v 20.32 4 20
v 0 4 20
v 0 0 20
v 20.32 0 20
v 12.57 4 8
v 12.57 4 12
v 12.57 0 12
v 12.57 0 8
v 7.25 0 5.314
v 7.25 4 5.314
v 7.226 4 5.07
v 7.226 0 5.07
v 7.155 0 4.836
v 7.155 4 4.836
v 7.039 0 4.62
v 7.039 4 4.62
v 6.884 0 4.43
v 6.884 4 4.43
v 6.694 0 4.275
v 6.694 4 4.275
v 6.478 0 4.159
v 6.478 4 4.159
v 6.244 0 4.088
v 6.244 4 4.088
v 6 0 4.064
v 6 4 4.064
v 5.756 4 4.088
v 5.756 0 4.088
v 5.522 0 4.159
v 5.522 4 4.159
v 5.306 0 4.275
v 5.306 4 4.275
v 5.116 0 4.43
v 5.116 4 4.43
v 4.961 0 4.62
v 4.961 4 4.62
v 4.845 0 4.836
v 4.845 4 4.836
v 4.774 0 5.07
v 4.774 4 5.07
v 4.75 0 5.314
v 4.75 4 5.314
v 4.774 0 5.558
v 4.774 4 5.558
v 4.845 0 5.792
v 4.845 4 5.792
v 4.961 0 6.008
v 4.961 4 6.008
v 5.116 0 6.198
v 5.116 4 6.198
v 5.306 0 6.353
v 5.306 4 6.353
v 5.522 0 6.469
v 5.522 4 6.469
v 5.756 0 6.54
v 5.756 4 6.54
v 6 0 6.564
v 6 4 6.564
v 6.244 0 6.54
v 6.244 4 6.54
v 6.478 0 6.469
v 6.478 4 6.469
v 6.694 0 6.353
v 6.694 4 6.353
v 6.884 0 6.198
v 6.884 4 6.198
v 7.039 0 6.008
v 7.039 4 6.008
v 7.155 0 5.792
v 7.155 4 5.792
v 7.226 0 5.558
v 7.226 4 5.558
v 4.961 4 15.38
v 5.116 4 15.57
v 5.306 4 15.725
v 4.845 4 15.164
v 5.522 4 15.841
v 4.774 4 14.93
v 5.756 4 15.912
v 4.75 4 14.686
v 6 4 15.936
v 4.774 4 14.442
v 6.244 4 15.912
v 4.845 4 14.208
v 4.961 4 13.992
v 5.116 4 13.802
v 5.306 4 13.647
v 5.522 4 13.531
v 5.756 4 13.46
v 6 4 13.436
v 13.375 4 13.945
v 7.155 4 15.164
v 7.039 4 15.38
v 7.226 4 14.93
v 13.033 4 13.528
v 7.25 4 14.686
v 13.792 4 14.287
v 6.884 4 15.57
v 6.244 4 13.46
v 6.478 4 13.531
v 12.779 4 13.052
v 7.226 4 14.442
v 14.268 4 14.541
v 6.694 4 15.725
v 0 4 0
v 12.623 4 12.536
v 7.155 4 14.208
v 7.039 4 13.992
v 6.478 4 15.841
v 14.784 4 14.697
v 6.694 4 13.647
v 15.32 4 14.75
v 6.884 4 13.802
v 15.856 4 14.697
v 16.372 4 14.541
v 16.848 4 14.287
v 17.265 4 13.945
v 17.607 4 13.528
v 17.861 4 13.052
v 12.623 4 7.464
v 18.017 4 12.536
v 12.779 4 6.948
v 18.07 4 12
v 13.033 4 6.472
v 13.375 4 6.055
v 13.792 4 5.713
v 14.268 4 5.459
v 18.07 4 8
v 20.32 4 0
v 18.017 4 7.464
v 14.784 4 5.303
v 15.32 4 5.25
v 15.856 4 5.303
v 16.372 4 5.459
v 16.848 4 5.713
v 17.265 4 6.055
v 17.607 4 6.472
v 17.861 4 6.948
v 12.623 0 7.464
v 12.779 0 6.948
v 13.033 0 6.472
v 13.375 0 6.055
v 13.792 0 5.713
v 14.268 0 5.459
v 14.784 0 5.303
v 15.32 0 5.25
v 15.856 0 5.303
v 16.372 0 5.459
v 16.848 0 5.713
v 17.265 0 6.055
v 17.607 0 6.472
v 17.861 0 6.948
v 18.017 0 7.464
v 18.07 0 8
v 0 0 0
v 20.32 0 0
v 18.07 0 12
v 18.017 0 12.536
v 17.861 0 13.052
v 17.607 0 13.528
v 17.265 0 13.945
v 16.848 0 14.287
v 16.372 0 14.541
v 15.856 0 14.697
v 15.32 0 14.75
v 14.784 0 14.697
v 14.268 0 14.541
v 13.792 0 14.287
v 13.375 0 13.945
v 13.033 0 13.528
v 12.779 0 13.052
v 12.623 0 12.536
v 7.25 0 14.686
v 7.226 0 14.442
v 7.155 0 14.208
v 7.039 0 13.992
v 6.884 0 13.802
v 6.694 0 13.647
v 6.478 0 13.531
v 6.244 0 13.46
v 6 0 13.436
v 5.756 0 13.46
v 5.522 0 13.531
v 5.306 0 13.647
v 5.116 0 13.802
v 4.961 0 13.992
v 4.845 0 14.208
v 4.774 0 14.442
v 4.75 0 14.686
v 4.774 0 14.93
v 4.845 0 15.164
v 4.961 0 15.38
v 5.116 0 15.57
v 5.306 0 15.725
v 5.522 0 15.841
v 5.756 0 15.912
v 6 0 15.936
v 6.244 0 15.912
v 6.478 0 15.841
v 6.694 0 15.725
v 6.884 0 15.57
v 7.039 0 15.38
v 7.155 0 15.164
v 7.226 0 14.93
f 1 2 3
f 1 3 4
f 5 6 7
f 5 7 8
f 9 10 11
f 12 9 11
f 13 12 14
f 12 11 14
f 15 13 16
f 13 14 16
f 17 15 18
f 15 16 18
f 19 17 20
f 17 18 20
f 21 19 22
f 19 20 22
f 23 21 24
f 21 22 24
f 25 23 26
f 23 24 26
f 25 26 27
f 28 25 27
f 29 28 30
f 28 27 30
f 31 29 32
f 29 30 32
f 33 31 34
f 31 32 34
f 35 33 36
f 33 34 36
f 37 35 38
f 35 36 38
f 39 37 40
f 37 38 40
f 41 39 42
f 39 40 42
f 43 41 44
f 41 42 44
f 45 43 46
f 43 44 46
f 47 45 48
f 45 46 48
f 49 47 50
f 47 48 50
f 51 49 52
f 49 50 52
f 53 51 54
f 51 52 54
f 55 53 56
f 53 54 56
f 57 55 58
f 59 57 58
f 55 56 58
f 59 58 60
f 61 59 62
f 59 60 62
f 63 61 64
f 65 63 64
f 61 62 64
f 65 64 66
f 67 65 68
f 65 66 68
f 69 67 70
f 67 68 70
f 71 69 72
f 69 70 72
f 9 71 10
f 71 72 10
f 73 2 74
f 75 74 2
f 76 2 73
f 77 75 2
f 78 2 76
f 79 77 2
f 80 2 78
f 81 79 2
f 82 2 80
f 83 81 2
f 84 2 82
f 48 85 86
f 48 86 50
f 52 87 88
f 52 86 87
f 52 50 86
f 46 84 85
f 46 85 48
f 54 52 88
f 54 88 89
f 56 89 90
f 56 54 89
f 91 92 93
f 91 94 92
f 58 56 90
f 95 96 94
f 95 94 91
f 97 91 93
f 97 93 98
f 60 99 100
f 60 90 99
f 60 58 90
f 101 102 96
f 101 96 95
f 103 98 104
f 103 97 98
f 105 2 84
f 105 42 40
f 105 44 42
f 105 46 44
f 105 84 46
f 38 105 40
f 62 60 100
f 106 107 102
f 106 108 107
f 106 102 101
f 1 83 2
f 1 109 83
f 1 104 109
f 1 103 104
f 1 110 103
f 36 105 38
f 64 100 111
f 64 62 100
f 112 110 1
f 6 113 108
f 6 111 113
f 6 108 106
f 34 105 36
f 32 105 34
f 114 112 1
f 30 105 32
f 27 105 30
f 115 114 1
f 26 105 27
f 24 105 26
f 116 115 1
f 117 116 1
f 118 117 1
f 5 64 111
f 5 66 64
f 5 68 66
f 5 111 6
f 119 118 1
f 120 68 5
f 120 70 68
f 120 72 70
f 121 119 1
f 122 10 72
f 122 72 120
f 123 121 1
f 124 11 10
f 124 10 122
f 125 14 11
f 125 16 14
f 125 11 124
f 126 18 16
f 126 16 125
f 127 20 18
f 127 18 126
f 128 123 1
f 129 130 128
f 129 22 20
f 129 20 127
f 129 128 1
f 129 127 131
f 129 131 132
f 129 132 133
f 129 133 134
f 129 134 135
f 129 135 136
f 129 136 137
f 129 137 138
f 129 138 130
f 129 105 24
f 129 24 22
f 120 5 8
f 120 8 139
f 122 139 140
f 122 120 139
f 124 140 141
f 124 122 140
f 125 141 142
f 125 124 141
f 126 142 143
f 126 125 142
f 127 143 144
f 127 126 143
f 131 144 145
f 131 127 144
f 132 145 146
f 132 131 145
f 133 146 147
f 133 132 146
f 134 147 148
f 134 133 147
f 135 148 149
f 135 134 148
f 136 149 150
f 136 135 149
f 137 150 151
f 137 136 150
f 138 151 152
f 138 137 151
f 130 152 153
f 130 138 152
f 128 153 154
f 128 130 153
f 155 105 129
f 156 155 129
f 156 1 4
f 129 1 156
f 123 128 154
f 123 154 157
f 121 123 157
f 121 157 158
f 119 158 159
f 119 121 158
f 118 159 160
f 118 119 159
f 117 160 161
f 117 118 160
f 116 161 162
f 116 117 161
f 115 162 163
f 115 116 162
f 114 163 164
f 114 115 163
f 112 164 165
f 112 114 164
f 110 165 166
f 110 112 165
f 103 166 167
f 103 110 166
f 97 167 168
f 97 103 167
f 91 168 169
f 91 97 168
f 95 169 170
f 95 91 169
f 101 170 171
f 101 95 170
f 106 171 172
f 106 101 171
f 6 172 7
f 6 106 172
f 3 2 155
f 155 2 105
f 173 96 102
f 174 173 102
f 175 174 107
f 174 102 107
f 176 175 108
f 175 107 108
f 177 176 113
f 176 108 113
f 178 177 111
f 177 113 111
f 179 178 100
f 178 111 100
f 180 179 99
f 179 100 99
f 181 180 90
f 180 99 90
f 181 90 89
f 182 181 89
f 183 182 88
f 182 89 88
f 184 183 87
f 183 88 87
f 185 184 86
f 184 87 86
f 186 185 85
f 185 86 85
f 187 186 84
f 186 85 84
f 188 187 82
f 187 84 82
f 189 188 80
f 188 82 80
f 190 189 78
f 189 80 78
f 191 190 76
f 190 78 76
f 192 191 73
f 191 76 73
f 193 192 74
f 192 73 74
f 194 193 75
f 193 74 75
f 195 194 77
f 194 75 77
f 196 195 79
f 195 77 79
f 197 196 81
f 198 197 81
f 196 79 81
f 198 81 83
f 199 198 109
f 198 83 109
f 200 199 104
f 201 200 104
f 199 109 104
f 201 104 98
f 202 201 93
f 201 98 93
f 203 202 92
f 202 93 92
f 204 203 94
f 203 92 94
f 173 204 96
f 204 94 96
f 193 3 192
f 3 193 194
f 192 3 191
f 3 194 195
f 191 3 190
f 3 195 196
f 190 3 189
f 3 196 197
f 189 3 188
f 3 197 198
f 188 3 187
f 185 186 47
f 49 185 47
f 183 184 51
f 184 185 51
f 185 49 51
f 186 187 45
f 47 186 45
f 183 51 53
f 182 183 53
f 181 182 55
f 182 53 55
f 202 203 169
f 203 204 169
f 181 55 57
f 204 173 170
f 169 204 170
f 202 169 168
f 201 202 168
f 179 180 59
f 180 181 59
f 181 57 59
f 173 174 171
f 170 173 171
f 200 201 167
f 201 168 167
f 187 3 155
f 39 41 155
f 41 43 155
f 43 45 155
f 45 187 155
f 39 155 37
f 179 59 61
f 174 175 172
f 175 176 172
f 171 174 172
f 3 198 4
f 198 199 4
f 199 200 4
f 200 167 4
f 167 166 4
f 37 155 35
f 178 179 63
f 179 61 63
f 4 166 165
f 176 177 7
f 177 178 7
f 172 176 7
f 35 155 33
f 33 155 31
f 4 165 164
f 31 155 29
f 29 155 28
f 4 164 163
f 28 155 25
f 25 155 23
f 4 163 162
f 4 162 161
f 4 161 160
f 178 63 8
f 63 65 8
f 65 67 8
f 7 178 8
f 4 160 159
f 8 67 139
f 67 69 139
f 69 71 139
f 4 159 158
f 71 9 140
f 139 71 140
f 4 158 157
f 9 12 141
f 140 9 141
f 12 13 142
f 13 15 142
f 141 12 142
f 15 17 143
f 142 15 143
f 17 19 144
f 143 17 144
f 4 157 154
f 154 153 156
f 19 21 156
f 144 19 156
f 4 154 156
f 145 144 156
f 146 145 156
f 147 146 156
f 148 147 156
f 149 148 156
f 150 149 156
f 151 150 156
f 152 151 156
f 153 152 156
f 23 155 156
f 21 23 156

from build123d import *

# Parameters (mm, degrees)
SKETCH1_W           = 20.32
SKETCH1_H           = 20
SKETCH1_R           = 1.25
BOSS_EXTRUDE1_DEPTH = 4


with BuildPart() as part:
    # Sketch1 → Boss-Extrude1 (new body)
    with BuildSketch(Plane(origin=(0, 4, 0), x_dir=(1, 0, 0), z_dir=(0, 1, 0))):
        with Locations((10.16, -10)):
            Rectangle(SKETCH1_W, SKETCH1_H)
        with Locations((6, -14.686)):
            Circle(SKETCH1_R, mode=Mode.SUBTRACT)
        with Locations((6, -5.314)):
            Circle(SKETCH1_R, mode=Mode.SUBTRACT)
        with BuildLine():
            Line((12.57, -12), (12.57, -8))
            ThreePointArc((12.57, -8), (15.32, -5.25), (18.07, -8))
            Line((18.07, -8), (18.07, -12))
            ThreePointArc((18.07, -12), (15.32, -14.75), (12.57, -12))
        make_face(mode=Mode.SUBTRACT)
    extrude(amount=-BOSS_EXTRUDE1_DEPTH)


solid = part.part
